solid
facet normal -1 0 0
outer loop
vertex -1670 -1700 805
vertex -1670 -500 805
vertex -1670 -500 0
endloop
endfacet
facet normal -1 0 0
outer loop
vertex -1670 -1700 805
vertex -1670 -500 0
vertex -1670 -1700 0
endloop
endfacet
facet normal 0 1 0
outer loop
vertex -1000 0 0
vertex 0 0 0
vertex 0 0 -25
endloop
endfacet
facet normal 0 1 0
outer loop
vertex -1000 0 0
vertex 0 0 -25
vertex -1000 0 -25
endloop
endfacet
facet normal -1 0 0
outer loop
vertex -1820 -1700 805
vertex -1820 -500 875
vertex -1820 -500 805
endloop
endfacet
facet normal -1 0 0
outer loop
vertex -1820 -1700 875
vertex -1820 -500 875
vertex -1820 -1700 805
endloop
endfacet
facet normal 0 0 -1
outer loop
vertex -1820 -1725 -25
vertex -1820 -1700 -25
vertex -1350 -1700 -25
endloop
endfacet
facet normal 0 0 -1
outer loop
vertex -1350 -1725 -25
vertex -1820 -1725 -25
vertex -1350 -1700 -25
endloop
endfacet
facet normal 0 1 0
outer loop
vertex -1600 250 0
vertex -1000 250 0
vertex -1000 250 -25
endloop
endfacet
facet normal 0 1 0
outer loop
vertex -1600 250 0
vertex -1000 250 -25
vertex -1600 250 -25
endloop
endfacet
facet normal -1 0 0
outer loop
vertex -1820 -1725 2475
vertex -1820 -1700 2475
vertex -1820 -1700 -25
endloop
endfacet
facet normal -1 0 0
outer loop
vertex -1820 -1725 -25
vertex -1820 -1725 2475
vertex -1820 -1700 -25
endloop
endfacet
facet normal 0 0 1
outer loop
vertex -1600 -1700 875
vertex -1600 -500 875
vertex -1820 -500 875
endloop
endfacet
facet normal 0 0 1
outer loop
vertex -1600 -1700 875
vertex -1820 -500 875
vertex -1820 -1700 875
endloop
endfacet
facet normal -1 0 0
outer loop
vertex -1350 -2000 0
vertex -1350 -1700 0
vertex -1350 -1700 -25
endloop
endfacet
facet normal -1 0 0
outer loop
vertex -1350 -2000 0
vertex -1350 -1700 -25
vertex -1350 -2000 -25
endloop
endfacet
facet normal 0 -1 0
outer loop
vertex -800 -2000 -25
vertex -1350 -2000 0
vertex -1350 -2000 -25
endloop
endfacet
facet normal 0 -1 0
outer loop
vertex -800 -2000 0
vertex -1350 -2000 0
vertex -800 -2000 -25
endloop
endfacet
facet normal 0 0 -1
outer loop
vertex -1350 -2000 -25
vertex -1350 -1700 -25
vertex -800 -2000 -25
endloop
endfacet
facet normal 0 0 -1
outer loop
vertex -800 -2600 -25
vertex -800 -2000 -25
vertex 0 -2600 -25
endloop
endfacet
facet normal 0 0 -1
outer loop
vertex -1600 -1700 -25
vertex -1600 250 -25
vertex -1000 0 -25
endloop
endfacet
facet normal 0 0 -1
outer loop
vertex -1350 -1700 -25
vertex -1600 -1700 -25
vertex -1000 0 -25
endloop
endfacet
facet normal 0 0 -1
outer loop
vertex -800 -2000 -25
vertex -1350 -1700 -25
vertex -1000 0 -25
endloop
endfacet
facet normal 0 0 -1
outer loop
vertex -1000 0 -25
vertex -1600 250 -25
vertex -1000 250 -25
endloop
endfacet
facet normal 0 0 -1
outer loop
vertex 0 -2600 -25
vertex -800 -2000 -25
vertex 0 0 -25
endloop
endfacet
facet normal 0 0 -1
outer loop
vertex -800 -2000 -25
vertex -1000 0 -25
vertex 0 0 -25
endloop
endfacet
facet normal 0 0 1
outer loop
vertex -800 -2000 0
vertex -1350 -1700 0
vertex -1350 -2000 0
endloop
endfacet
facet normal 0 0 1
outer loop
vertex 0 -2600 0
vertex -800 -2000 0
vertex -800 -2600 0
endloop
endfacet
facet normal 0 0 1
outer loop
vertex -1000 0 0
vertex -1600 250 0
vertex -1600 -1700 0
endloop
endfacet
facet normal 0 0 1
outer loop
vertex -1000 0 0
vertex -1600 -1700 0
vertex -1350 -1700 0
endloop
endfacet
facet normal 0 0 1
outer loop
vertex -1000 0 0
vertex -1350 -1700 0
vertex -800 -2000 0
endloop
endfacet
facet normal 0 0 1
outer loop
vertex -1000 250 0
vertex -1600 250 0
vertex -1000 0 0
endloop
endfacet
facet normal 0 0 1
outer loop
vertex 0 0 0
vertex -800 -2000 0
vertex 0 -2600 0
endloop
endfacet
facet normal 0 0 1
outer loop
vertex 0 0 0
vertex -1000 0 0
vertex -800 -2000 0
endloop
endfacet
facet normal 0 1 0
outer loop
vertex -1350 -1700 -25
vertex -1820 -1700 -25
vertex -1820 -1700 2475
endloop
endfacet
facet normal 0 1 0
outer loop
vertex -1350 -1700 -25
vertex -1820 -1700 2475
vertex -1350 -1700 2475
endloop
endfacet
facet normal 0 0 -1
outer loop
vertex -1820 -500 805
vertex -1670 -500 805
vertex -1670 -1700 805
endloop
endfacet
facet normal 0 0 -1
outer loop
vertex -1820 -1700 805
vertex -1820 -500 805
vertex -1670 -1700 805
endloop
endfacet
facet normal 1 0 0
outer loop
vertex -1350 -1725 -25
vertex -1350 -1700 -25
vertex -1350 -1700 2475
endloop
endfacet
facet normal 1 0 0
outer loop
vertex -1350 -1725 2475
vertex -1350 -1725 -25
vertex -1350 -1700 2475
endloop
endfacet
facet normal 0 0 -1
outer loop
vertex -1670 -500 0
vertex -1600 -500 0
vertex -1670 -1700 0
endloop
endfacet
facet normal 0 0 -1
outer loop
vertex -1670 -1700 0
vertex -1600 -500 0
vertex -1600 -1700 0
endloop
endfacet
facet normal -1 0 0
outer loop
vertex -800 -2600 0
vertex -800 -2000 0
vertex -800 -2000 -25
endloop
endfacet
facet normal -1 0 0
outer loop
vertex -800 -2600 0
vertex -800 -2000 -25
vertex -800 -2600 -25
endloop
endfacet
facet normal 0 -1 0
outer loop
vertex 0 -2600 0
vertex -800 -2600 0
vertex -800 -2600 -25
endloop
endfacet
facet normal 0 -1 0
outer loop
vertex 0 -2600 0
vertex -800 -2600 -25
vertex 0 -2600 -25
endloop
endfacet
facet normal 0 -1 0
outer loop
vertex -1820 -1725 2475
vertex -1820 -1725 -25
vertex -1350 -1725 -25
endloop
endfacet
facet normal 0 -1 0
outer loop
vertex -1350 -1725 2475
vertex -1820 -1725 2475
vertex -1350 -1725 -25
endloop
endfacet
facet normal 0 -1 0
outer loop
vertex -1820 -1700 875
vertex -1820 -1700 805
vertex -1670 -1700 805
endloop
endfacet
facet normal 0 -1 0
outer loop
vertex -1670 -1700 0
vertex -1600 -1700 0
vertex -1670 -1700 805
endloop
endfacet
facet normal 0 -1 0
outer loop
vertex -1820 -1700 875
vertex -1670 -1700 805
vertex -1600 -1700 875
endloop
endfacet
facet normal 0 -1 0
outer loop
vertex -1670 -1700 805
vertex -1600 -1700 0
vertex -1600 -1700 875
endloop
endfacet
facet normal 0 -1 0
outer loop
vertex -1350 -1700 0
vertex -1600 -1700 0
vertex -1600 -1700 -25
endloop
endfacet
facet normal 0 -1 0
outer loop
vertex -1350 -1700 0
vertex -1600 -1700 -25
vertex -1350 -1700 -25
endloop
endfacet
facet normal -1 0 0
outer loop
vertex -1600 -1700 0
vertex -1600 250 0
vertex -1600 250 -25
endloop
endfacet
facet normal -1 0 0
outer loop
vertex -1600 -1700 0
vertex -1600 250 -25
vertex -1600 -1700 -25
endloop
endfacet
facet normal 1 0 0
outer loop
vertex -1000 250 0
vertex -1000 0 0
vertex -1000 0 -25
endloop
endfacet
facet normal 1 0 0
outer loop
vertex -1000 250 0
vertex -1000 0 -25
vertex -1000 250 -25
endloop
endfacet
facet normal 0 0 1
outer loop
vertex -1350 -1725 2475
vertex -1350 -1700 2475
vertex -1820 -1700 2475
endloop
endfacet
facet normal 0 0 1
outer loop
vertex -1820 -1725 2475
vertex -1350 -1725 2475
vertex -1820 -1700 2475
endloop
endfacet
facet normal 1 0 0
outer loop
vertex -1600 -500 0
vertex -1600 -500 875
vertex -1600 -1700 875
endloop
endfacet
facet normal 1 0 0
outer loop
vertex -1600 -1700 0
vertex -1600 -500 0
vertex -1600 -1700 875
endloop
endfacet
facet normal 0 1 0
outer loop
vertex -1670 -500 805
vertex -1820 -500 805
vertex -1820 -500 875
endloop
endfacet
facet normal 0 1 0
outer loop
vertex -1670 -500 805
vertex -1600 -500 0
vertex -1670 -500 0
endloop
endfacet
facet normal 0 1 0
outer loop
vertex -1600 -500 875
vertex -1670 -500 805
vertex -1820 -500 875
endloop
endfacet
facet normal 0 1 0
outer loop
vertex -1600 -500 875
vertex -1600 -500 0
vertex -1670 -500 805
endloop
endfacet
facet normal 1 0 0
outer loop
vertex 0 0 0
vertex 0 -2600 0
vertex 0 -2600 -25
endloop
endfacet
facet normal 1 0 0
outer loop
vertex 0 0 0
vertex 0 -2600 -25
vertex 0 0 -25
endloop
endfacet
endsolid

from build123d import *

# Parameters (mm, degrees)
F1_DEPTH = 25
F2_W     = 1200
F2_H     = 875
F3_DEPTH = 70
F4_W     = 1200
F4_H     = 70
F5_DEPTH = 150
F6_W     = 250
F6_H     = 25
F7_DEPTH = 25


with BuildPart() as f1:
    # F0 (on Top) → F1 (new body)
    with BuildSketch(Plane.XY):
        Polygon((0, -2600), (0, 0), (-1000, 0), (-1000, 250), (-1600, 250), (-1600, -1700), (-1350, -1700), (-1350, -2000), (-800, -2000), (-800, -2600), align=None)
    extrude(amount=-F1_DEPTH)


with BuildPart() as f3:
    # F2 (on face) → F3 (new body)
    with BuildSketch(Plane(origin=(-1600, 0, 0), x_dir=(0, -1, 0), z_dir=(-1, 0, 0))):
        with Locations((1100, 437.5)):
            Rectangle(F2_W, F2_H)
    extrude(amount=F3_DEPTH)

    # F4 (on face) → F5 (join)
    with BuildSketch(Plane(origin=(-1670, 0, 0), x_dir=(0, -1, 0), z_dir=(-1, 0, 0))):
        with Locations((1100, 840)):
            Rectangle(F4_W, F4_H)
    extrude(amount=F5_DEPTH)


with BuildPart() as f7:
    # F6 (on face) → F7 (new body)
    with BuildSketch(Plane.XZ.offset(1700)):
        Polygon((-1820, -25), (-1600, -25), (-1600, 0), (-1350, 0), (-1350, 2475), (-1820, 2475), align=None)
        with Locations((-1475, -12.5)):
            Rectangle(F6_W, F6_H)
    extrude(amount=F7_DEPTH)


solid = Compound([f1.part, f3.part, f7.part])
